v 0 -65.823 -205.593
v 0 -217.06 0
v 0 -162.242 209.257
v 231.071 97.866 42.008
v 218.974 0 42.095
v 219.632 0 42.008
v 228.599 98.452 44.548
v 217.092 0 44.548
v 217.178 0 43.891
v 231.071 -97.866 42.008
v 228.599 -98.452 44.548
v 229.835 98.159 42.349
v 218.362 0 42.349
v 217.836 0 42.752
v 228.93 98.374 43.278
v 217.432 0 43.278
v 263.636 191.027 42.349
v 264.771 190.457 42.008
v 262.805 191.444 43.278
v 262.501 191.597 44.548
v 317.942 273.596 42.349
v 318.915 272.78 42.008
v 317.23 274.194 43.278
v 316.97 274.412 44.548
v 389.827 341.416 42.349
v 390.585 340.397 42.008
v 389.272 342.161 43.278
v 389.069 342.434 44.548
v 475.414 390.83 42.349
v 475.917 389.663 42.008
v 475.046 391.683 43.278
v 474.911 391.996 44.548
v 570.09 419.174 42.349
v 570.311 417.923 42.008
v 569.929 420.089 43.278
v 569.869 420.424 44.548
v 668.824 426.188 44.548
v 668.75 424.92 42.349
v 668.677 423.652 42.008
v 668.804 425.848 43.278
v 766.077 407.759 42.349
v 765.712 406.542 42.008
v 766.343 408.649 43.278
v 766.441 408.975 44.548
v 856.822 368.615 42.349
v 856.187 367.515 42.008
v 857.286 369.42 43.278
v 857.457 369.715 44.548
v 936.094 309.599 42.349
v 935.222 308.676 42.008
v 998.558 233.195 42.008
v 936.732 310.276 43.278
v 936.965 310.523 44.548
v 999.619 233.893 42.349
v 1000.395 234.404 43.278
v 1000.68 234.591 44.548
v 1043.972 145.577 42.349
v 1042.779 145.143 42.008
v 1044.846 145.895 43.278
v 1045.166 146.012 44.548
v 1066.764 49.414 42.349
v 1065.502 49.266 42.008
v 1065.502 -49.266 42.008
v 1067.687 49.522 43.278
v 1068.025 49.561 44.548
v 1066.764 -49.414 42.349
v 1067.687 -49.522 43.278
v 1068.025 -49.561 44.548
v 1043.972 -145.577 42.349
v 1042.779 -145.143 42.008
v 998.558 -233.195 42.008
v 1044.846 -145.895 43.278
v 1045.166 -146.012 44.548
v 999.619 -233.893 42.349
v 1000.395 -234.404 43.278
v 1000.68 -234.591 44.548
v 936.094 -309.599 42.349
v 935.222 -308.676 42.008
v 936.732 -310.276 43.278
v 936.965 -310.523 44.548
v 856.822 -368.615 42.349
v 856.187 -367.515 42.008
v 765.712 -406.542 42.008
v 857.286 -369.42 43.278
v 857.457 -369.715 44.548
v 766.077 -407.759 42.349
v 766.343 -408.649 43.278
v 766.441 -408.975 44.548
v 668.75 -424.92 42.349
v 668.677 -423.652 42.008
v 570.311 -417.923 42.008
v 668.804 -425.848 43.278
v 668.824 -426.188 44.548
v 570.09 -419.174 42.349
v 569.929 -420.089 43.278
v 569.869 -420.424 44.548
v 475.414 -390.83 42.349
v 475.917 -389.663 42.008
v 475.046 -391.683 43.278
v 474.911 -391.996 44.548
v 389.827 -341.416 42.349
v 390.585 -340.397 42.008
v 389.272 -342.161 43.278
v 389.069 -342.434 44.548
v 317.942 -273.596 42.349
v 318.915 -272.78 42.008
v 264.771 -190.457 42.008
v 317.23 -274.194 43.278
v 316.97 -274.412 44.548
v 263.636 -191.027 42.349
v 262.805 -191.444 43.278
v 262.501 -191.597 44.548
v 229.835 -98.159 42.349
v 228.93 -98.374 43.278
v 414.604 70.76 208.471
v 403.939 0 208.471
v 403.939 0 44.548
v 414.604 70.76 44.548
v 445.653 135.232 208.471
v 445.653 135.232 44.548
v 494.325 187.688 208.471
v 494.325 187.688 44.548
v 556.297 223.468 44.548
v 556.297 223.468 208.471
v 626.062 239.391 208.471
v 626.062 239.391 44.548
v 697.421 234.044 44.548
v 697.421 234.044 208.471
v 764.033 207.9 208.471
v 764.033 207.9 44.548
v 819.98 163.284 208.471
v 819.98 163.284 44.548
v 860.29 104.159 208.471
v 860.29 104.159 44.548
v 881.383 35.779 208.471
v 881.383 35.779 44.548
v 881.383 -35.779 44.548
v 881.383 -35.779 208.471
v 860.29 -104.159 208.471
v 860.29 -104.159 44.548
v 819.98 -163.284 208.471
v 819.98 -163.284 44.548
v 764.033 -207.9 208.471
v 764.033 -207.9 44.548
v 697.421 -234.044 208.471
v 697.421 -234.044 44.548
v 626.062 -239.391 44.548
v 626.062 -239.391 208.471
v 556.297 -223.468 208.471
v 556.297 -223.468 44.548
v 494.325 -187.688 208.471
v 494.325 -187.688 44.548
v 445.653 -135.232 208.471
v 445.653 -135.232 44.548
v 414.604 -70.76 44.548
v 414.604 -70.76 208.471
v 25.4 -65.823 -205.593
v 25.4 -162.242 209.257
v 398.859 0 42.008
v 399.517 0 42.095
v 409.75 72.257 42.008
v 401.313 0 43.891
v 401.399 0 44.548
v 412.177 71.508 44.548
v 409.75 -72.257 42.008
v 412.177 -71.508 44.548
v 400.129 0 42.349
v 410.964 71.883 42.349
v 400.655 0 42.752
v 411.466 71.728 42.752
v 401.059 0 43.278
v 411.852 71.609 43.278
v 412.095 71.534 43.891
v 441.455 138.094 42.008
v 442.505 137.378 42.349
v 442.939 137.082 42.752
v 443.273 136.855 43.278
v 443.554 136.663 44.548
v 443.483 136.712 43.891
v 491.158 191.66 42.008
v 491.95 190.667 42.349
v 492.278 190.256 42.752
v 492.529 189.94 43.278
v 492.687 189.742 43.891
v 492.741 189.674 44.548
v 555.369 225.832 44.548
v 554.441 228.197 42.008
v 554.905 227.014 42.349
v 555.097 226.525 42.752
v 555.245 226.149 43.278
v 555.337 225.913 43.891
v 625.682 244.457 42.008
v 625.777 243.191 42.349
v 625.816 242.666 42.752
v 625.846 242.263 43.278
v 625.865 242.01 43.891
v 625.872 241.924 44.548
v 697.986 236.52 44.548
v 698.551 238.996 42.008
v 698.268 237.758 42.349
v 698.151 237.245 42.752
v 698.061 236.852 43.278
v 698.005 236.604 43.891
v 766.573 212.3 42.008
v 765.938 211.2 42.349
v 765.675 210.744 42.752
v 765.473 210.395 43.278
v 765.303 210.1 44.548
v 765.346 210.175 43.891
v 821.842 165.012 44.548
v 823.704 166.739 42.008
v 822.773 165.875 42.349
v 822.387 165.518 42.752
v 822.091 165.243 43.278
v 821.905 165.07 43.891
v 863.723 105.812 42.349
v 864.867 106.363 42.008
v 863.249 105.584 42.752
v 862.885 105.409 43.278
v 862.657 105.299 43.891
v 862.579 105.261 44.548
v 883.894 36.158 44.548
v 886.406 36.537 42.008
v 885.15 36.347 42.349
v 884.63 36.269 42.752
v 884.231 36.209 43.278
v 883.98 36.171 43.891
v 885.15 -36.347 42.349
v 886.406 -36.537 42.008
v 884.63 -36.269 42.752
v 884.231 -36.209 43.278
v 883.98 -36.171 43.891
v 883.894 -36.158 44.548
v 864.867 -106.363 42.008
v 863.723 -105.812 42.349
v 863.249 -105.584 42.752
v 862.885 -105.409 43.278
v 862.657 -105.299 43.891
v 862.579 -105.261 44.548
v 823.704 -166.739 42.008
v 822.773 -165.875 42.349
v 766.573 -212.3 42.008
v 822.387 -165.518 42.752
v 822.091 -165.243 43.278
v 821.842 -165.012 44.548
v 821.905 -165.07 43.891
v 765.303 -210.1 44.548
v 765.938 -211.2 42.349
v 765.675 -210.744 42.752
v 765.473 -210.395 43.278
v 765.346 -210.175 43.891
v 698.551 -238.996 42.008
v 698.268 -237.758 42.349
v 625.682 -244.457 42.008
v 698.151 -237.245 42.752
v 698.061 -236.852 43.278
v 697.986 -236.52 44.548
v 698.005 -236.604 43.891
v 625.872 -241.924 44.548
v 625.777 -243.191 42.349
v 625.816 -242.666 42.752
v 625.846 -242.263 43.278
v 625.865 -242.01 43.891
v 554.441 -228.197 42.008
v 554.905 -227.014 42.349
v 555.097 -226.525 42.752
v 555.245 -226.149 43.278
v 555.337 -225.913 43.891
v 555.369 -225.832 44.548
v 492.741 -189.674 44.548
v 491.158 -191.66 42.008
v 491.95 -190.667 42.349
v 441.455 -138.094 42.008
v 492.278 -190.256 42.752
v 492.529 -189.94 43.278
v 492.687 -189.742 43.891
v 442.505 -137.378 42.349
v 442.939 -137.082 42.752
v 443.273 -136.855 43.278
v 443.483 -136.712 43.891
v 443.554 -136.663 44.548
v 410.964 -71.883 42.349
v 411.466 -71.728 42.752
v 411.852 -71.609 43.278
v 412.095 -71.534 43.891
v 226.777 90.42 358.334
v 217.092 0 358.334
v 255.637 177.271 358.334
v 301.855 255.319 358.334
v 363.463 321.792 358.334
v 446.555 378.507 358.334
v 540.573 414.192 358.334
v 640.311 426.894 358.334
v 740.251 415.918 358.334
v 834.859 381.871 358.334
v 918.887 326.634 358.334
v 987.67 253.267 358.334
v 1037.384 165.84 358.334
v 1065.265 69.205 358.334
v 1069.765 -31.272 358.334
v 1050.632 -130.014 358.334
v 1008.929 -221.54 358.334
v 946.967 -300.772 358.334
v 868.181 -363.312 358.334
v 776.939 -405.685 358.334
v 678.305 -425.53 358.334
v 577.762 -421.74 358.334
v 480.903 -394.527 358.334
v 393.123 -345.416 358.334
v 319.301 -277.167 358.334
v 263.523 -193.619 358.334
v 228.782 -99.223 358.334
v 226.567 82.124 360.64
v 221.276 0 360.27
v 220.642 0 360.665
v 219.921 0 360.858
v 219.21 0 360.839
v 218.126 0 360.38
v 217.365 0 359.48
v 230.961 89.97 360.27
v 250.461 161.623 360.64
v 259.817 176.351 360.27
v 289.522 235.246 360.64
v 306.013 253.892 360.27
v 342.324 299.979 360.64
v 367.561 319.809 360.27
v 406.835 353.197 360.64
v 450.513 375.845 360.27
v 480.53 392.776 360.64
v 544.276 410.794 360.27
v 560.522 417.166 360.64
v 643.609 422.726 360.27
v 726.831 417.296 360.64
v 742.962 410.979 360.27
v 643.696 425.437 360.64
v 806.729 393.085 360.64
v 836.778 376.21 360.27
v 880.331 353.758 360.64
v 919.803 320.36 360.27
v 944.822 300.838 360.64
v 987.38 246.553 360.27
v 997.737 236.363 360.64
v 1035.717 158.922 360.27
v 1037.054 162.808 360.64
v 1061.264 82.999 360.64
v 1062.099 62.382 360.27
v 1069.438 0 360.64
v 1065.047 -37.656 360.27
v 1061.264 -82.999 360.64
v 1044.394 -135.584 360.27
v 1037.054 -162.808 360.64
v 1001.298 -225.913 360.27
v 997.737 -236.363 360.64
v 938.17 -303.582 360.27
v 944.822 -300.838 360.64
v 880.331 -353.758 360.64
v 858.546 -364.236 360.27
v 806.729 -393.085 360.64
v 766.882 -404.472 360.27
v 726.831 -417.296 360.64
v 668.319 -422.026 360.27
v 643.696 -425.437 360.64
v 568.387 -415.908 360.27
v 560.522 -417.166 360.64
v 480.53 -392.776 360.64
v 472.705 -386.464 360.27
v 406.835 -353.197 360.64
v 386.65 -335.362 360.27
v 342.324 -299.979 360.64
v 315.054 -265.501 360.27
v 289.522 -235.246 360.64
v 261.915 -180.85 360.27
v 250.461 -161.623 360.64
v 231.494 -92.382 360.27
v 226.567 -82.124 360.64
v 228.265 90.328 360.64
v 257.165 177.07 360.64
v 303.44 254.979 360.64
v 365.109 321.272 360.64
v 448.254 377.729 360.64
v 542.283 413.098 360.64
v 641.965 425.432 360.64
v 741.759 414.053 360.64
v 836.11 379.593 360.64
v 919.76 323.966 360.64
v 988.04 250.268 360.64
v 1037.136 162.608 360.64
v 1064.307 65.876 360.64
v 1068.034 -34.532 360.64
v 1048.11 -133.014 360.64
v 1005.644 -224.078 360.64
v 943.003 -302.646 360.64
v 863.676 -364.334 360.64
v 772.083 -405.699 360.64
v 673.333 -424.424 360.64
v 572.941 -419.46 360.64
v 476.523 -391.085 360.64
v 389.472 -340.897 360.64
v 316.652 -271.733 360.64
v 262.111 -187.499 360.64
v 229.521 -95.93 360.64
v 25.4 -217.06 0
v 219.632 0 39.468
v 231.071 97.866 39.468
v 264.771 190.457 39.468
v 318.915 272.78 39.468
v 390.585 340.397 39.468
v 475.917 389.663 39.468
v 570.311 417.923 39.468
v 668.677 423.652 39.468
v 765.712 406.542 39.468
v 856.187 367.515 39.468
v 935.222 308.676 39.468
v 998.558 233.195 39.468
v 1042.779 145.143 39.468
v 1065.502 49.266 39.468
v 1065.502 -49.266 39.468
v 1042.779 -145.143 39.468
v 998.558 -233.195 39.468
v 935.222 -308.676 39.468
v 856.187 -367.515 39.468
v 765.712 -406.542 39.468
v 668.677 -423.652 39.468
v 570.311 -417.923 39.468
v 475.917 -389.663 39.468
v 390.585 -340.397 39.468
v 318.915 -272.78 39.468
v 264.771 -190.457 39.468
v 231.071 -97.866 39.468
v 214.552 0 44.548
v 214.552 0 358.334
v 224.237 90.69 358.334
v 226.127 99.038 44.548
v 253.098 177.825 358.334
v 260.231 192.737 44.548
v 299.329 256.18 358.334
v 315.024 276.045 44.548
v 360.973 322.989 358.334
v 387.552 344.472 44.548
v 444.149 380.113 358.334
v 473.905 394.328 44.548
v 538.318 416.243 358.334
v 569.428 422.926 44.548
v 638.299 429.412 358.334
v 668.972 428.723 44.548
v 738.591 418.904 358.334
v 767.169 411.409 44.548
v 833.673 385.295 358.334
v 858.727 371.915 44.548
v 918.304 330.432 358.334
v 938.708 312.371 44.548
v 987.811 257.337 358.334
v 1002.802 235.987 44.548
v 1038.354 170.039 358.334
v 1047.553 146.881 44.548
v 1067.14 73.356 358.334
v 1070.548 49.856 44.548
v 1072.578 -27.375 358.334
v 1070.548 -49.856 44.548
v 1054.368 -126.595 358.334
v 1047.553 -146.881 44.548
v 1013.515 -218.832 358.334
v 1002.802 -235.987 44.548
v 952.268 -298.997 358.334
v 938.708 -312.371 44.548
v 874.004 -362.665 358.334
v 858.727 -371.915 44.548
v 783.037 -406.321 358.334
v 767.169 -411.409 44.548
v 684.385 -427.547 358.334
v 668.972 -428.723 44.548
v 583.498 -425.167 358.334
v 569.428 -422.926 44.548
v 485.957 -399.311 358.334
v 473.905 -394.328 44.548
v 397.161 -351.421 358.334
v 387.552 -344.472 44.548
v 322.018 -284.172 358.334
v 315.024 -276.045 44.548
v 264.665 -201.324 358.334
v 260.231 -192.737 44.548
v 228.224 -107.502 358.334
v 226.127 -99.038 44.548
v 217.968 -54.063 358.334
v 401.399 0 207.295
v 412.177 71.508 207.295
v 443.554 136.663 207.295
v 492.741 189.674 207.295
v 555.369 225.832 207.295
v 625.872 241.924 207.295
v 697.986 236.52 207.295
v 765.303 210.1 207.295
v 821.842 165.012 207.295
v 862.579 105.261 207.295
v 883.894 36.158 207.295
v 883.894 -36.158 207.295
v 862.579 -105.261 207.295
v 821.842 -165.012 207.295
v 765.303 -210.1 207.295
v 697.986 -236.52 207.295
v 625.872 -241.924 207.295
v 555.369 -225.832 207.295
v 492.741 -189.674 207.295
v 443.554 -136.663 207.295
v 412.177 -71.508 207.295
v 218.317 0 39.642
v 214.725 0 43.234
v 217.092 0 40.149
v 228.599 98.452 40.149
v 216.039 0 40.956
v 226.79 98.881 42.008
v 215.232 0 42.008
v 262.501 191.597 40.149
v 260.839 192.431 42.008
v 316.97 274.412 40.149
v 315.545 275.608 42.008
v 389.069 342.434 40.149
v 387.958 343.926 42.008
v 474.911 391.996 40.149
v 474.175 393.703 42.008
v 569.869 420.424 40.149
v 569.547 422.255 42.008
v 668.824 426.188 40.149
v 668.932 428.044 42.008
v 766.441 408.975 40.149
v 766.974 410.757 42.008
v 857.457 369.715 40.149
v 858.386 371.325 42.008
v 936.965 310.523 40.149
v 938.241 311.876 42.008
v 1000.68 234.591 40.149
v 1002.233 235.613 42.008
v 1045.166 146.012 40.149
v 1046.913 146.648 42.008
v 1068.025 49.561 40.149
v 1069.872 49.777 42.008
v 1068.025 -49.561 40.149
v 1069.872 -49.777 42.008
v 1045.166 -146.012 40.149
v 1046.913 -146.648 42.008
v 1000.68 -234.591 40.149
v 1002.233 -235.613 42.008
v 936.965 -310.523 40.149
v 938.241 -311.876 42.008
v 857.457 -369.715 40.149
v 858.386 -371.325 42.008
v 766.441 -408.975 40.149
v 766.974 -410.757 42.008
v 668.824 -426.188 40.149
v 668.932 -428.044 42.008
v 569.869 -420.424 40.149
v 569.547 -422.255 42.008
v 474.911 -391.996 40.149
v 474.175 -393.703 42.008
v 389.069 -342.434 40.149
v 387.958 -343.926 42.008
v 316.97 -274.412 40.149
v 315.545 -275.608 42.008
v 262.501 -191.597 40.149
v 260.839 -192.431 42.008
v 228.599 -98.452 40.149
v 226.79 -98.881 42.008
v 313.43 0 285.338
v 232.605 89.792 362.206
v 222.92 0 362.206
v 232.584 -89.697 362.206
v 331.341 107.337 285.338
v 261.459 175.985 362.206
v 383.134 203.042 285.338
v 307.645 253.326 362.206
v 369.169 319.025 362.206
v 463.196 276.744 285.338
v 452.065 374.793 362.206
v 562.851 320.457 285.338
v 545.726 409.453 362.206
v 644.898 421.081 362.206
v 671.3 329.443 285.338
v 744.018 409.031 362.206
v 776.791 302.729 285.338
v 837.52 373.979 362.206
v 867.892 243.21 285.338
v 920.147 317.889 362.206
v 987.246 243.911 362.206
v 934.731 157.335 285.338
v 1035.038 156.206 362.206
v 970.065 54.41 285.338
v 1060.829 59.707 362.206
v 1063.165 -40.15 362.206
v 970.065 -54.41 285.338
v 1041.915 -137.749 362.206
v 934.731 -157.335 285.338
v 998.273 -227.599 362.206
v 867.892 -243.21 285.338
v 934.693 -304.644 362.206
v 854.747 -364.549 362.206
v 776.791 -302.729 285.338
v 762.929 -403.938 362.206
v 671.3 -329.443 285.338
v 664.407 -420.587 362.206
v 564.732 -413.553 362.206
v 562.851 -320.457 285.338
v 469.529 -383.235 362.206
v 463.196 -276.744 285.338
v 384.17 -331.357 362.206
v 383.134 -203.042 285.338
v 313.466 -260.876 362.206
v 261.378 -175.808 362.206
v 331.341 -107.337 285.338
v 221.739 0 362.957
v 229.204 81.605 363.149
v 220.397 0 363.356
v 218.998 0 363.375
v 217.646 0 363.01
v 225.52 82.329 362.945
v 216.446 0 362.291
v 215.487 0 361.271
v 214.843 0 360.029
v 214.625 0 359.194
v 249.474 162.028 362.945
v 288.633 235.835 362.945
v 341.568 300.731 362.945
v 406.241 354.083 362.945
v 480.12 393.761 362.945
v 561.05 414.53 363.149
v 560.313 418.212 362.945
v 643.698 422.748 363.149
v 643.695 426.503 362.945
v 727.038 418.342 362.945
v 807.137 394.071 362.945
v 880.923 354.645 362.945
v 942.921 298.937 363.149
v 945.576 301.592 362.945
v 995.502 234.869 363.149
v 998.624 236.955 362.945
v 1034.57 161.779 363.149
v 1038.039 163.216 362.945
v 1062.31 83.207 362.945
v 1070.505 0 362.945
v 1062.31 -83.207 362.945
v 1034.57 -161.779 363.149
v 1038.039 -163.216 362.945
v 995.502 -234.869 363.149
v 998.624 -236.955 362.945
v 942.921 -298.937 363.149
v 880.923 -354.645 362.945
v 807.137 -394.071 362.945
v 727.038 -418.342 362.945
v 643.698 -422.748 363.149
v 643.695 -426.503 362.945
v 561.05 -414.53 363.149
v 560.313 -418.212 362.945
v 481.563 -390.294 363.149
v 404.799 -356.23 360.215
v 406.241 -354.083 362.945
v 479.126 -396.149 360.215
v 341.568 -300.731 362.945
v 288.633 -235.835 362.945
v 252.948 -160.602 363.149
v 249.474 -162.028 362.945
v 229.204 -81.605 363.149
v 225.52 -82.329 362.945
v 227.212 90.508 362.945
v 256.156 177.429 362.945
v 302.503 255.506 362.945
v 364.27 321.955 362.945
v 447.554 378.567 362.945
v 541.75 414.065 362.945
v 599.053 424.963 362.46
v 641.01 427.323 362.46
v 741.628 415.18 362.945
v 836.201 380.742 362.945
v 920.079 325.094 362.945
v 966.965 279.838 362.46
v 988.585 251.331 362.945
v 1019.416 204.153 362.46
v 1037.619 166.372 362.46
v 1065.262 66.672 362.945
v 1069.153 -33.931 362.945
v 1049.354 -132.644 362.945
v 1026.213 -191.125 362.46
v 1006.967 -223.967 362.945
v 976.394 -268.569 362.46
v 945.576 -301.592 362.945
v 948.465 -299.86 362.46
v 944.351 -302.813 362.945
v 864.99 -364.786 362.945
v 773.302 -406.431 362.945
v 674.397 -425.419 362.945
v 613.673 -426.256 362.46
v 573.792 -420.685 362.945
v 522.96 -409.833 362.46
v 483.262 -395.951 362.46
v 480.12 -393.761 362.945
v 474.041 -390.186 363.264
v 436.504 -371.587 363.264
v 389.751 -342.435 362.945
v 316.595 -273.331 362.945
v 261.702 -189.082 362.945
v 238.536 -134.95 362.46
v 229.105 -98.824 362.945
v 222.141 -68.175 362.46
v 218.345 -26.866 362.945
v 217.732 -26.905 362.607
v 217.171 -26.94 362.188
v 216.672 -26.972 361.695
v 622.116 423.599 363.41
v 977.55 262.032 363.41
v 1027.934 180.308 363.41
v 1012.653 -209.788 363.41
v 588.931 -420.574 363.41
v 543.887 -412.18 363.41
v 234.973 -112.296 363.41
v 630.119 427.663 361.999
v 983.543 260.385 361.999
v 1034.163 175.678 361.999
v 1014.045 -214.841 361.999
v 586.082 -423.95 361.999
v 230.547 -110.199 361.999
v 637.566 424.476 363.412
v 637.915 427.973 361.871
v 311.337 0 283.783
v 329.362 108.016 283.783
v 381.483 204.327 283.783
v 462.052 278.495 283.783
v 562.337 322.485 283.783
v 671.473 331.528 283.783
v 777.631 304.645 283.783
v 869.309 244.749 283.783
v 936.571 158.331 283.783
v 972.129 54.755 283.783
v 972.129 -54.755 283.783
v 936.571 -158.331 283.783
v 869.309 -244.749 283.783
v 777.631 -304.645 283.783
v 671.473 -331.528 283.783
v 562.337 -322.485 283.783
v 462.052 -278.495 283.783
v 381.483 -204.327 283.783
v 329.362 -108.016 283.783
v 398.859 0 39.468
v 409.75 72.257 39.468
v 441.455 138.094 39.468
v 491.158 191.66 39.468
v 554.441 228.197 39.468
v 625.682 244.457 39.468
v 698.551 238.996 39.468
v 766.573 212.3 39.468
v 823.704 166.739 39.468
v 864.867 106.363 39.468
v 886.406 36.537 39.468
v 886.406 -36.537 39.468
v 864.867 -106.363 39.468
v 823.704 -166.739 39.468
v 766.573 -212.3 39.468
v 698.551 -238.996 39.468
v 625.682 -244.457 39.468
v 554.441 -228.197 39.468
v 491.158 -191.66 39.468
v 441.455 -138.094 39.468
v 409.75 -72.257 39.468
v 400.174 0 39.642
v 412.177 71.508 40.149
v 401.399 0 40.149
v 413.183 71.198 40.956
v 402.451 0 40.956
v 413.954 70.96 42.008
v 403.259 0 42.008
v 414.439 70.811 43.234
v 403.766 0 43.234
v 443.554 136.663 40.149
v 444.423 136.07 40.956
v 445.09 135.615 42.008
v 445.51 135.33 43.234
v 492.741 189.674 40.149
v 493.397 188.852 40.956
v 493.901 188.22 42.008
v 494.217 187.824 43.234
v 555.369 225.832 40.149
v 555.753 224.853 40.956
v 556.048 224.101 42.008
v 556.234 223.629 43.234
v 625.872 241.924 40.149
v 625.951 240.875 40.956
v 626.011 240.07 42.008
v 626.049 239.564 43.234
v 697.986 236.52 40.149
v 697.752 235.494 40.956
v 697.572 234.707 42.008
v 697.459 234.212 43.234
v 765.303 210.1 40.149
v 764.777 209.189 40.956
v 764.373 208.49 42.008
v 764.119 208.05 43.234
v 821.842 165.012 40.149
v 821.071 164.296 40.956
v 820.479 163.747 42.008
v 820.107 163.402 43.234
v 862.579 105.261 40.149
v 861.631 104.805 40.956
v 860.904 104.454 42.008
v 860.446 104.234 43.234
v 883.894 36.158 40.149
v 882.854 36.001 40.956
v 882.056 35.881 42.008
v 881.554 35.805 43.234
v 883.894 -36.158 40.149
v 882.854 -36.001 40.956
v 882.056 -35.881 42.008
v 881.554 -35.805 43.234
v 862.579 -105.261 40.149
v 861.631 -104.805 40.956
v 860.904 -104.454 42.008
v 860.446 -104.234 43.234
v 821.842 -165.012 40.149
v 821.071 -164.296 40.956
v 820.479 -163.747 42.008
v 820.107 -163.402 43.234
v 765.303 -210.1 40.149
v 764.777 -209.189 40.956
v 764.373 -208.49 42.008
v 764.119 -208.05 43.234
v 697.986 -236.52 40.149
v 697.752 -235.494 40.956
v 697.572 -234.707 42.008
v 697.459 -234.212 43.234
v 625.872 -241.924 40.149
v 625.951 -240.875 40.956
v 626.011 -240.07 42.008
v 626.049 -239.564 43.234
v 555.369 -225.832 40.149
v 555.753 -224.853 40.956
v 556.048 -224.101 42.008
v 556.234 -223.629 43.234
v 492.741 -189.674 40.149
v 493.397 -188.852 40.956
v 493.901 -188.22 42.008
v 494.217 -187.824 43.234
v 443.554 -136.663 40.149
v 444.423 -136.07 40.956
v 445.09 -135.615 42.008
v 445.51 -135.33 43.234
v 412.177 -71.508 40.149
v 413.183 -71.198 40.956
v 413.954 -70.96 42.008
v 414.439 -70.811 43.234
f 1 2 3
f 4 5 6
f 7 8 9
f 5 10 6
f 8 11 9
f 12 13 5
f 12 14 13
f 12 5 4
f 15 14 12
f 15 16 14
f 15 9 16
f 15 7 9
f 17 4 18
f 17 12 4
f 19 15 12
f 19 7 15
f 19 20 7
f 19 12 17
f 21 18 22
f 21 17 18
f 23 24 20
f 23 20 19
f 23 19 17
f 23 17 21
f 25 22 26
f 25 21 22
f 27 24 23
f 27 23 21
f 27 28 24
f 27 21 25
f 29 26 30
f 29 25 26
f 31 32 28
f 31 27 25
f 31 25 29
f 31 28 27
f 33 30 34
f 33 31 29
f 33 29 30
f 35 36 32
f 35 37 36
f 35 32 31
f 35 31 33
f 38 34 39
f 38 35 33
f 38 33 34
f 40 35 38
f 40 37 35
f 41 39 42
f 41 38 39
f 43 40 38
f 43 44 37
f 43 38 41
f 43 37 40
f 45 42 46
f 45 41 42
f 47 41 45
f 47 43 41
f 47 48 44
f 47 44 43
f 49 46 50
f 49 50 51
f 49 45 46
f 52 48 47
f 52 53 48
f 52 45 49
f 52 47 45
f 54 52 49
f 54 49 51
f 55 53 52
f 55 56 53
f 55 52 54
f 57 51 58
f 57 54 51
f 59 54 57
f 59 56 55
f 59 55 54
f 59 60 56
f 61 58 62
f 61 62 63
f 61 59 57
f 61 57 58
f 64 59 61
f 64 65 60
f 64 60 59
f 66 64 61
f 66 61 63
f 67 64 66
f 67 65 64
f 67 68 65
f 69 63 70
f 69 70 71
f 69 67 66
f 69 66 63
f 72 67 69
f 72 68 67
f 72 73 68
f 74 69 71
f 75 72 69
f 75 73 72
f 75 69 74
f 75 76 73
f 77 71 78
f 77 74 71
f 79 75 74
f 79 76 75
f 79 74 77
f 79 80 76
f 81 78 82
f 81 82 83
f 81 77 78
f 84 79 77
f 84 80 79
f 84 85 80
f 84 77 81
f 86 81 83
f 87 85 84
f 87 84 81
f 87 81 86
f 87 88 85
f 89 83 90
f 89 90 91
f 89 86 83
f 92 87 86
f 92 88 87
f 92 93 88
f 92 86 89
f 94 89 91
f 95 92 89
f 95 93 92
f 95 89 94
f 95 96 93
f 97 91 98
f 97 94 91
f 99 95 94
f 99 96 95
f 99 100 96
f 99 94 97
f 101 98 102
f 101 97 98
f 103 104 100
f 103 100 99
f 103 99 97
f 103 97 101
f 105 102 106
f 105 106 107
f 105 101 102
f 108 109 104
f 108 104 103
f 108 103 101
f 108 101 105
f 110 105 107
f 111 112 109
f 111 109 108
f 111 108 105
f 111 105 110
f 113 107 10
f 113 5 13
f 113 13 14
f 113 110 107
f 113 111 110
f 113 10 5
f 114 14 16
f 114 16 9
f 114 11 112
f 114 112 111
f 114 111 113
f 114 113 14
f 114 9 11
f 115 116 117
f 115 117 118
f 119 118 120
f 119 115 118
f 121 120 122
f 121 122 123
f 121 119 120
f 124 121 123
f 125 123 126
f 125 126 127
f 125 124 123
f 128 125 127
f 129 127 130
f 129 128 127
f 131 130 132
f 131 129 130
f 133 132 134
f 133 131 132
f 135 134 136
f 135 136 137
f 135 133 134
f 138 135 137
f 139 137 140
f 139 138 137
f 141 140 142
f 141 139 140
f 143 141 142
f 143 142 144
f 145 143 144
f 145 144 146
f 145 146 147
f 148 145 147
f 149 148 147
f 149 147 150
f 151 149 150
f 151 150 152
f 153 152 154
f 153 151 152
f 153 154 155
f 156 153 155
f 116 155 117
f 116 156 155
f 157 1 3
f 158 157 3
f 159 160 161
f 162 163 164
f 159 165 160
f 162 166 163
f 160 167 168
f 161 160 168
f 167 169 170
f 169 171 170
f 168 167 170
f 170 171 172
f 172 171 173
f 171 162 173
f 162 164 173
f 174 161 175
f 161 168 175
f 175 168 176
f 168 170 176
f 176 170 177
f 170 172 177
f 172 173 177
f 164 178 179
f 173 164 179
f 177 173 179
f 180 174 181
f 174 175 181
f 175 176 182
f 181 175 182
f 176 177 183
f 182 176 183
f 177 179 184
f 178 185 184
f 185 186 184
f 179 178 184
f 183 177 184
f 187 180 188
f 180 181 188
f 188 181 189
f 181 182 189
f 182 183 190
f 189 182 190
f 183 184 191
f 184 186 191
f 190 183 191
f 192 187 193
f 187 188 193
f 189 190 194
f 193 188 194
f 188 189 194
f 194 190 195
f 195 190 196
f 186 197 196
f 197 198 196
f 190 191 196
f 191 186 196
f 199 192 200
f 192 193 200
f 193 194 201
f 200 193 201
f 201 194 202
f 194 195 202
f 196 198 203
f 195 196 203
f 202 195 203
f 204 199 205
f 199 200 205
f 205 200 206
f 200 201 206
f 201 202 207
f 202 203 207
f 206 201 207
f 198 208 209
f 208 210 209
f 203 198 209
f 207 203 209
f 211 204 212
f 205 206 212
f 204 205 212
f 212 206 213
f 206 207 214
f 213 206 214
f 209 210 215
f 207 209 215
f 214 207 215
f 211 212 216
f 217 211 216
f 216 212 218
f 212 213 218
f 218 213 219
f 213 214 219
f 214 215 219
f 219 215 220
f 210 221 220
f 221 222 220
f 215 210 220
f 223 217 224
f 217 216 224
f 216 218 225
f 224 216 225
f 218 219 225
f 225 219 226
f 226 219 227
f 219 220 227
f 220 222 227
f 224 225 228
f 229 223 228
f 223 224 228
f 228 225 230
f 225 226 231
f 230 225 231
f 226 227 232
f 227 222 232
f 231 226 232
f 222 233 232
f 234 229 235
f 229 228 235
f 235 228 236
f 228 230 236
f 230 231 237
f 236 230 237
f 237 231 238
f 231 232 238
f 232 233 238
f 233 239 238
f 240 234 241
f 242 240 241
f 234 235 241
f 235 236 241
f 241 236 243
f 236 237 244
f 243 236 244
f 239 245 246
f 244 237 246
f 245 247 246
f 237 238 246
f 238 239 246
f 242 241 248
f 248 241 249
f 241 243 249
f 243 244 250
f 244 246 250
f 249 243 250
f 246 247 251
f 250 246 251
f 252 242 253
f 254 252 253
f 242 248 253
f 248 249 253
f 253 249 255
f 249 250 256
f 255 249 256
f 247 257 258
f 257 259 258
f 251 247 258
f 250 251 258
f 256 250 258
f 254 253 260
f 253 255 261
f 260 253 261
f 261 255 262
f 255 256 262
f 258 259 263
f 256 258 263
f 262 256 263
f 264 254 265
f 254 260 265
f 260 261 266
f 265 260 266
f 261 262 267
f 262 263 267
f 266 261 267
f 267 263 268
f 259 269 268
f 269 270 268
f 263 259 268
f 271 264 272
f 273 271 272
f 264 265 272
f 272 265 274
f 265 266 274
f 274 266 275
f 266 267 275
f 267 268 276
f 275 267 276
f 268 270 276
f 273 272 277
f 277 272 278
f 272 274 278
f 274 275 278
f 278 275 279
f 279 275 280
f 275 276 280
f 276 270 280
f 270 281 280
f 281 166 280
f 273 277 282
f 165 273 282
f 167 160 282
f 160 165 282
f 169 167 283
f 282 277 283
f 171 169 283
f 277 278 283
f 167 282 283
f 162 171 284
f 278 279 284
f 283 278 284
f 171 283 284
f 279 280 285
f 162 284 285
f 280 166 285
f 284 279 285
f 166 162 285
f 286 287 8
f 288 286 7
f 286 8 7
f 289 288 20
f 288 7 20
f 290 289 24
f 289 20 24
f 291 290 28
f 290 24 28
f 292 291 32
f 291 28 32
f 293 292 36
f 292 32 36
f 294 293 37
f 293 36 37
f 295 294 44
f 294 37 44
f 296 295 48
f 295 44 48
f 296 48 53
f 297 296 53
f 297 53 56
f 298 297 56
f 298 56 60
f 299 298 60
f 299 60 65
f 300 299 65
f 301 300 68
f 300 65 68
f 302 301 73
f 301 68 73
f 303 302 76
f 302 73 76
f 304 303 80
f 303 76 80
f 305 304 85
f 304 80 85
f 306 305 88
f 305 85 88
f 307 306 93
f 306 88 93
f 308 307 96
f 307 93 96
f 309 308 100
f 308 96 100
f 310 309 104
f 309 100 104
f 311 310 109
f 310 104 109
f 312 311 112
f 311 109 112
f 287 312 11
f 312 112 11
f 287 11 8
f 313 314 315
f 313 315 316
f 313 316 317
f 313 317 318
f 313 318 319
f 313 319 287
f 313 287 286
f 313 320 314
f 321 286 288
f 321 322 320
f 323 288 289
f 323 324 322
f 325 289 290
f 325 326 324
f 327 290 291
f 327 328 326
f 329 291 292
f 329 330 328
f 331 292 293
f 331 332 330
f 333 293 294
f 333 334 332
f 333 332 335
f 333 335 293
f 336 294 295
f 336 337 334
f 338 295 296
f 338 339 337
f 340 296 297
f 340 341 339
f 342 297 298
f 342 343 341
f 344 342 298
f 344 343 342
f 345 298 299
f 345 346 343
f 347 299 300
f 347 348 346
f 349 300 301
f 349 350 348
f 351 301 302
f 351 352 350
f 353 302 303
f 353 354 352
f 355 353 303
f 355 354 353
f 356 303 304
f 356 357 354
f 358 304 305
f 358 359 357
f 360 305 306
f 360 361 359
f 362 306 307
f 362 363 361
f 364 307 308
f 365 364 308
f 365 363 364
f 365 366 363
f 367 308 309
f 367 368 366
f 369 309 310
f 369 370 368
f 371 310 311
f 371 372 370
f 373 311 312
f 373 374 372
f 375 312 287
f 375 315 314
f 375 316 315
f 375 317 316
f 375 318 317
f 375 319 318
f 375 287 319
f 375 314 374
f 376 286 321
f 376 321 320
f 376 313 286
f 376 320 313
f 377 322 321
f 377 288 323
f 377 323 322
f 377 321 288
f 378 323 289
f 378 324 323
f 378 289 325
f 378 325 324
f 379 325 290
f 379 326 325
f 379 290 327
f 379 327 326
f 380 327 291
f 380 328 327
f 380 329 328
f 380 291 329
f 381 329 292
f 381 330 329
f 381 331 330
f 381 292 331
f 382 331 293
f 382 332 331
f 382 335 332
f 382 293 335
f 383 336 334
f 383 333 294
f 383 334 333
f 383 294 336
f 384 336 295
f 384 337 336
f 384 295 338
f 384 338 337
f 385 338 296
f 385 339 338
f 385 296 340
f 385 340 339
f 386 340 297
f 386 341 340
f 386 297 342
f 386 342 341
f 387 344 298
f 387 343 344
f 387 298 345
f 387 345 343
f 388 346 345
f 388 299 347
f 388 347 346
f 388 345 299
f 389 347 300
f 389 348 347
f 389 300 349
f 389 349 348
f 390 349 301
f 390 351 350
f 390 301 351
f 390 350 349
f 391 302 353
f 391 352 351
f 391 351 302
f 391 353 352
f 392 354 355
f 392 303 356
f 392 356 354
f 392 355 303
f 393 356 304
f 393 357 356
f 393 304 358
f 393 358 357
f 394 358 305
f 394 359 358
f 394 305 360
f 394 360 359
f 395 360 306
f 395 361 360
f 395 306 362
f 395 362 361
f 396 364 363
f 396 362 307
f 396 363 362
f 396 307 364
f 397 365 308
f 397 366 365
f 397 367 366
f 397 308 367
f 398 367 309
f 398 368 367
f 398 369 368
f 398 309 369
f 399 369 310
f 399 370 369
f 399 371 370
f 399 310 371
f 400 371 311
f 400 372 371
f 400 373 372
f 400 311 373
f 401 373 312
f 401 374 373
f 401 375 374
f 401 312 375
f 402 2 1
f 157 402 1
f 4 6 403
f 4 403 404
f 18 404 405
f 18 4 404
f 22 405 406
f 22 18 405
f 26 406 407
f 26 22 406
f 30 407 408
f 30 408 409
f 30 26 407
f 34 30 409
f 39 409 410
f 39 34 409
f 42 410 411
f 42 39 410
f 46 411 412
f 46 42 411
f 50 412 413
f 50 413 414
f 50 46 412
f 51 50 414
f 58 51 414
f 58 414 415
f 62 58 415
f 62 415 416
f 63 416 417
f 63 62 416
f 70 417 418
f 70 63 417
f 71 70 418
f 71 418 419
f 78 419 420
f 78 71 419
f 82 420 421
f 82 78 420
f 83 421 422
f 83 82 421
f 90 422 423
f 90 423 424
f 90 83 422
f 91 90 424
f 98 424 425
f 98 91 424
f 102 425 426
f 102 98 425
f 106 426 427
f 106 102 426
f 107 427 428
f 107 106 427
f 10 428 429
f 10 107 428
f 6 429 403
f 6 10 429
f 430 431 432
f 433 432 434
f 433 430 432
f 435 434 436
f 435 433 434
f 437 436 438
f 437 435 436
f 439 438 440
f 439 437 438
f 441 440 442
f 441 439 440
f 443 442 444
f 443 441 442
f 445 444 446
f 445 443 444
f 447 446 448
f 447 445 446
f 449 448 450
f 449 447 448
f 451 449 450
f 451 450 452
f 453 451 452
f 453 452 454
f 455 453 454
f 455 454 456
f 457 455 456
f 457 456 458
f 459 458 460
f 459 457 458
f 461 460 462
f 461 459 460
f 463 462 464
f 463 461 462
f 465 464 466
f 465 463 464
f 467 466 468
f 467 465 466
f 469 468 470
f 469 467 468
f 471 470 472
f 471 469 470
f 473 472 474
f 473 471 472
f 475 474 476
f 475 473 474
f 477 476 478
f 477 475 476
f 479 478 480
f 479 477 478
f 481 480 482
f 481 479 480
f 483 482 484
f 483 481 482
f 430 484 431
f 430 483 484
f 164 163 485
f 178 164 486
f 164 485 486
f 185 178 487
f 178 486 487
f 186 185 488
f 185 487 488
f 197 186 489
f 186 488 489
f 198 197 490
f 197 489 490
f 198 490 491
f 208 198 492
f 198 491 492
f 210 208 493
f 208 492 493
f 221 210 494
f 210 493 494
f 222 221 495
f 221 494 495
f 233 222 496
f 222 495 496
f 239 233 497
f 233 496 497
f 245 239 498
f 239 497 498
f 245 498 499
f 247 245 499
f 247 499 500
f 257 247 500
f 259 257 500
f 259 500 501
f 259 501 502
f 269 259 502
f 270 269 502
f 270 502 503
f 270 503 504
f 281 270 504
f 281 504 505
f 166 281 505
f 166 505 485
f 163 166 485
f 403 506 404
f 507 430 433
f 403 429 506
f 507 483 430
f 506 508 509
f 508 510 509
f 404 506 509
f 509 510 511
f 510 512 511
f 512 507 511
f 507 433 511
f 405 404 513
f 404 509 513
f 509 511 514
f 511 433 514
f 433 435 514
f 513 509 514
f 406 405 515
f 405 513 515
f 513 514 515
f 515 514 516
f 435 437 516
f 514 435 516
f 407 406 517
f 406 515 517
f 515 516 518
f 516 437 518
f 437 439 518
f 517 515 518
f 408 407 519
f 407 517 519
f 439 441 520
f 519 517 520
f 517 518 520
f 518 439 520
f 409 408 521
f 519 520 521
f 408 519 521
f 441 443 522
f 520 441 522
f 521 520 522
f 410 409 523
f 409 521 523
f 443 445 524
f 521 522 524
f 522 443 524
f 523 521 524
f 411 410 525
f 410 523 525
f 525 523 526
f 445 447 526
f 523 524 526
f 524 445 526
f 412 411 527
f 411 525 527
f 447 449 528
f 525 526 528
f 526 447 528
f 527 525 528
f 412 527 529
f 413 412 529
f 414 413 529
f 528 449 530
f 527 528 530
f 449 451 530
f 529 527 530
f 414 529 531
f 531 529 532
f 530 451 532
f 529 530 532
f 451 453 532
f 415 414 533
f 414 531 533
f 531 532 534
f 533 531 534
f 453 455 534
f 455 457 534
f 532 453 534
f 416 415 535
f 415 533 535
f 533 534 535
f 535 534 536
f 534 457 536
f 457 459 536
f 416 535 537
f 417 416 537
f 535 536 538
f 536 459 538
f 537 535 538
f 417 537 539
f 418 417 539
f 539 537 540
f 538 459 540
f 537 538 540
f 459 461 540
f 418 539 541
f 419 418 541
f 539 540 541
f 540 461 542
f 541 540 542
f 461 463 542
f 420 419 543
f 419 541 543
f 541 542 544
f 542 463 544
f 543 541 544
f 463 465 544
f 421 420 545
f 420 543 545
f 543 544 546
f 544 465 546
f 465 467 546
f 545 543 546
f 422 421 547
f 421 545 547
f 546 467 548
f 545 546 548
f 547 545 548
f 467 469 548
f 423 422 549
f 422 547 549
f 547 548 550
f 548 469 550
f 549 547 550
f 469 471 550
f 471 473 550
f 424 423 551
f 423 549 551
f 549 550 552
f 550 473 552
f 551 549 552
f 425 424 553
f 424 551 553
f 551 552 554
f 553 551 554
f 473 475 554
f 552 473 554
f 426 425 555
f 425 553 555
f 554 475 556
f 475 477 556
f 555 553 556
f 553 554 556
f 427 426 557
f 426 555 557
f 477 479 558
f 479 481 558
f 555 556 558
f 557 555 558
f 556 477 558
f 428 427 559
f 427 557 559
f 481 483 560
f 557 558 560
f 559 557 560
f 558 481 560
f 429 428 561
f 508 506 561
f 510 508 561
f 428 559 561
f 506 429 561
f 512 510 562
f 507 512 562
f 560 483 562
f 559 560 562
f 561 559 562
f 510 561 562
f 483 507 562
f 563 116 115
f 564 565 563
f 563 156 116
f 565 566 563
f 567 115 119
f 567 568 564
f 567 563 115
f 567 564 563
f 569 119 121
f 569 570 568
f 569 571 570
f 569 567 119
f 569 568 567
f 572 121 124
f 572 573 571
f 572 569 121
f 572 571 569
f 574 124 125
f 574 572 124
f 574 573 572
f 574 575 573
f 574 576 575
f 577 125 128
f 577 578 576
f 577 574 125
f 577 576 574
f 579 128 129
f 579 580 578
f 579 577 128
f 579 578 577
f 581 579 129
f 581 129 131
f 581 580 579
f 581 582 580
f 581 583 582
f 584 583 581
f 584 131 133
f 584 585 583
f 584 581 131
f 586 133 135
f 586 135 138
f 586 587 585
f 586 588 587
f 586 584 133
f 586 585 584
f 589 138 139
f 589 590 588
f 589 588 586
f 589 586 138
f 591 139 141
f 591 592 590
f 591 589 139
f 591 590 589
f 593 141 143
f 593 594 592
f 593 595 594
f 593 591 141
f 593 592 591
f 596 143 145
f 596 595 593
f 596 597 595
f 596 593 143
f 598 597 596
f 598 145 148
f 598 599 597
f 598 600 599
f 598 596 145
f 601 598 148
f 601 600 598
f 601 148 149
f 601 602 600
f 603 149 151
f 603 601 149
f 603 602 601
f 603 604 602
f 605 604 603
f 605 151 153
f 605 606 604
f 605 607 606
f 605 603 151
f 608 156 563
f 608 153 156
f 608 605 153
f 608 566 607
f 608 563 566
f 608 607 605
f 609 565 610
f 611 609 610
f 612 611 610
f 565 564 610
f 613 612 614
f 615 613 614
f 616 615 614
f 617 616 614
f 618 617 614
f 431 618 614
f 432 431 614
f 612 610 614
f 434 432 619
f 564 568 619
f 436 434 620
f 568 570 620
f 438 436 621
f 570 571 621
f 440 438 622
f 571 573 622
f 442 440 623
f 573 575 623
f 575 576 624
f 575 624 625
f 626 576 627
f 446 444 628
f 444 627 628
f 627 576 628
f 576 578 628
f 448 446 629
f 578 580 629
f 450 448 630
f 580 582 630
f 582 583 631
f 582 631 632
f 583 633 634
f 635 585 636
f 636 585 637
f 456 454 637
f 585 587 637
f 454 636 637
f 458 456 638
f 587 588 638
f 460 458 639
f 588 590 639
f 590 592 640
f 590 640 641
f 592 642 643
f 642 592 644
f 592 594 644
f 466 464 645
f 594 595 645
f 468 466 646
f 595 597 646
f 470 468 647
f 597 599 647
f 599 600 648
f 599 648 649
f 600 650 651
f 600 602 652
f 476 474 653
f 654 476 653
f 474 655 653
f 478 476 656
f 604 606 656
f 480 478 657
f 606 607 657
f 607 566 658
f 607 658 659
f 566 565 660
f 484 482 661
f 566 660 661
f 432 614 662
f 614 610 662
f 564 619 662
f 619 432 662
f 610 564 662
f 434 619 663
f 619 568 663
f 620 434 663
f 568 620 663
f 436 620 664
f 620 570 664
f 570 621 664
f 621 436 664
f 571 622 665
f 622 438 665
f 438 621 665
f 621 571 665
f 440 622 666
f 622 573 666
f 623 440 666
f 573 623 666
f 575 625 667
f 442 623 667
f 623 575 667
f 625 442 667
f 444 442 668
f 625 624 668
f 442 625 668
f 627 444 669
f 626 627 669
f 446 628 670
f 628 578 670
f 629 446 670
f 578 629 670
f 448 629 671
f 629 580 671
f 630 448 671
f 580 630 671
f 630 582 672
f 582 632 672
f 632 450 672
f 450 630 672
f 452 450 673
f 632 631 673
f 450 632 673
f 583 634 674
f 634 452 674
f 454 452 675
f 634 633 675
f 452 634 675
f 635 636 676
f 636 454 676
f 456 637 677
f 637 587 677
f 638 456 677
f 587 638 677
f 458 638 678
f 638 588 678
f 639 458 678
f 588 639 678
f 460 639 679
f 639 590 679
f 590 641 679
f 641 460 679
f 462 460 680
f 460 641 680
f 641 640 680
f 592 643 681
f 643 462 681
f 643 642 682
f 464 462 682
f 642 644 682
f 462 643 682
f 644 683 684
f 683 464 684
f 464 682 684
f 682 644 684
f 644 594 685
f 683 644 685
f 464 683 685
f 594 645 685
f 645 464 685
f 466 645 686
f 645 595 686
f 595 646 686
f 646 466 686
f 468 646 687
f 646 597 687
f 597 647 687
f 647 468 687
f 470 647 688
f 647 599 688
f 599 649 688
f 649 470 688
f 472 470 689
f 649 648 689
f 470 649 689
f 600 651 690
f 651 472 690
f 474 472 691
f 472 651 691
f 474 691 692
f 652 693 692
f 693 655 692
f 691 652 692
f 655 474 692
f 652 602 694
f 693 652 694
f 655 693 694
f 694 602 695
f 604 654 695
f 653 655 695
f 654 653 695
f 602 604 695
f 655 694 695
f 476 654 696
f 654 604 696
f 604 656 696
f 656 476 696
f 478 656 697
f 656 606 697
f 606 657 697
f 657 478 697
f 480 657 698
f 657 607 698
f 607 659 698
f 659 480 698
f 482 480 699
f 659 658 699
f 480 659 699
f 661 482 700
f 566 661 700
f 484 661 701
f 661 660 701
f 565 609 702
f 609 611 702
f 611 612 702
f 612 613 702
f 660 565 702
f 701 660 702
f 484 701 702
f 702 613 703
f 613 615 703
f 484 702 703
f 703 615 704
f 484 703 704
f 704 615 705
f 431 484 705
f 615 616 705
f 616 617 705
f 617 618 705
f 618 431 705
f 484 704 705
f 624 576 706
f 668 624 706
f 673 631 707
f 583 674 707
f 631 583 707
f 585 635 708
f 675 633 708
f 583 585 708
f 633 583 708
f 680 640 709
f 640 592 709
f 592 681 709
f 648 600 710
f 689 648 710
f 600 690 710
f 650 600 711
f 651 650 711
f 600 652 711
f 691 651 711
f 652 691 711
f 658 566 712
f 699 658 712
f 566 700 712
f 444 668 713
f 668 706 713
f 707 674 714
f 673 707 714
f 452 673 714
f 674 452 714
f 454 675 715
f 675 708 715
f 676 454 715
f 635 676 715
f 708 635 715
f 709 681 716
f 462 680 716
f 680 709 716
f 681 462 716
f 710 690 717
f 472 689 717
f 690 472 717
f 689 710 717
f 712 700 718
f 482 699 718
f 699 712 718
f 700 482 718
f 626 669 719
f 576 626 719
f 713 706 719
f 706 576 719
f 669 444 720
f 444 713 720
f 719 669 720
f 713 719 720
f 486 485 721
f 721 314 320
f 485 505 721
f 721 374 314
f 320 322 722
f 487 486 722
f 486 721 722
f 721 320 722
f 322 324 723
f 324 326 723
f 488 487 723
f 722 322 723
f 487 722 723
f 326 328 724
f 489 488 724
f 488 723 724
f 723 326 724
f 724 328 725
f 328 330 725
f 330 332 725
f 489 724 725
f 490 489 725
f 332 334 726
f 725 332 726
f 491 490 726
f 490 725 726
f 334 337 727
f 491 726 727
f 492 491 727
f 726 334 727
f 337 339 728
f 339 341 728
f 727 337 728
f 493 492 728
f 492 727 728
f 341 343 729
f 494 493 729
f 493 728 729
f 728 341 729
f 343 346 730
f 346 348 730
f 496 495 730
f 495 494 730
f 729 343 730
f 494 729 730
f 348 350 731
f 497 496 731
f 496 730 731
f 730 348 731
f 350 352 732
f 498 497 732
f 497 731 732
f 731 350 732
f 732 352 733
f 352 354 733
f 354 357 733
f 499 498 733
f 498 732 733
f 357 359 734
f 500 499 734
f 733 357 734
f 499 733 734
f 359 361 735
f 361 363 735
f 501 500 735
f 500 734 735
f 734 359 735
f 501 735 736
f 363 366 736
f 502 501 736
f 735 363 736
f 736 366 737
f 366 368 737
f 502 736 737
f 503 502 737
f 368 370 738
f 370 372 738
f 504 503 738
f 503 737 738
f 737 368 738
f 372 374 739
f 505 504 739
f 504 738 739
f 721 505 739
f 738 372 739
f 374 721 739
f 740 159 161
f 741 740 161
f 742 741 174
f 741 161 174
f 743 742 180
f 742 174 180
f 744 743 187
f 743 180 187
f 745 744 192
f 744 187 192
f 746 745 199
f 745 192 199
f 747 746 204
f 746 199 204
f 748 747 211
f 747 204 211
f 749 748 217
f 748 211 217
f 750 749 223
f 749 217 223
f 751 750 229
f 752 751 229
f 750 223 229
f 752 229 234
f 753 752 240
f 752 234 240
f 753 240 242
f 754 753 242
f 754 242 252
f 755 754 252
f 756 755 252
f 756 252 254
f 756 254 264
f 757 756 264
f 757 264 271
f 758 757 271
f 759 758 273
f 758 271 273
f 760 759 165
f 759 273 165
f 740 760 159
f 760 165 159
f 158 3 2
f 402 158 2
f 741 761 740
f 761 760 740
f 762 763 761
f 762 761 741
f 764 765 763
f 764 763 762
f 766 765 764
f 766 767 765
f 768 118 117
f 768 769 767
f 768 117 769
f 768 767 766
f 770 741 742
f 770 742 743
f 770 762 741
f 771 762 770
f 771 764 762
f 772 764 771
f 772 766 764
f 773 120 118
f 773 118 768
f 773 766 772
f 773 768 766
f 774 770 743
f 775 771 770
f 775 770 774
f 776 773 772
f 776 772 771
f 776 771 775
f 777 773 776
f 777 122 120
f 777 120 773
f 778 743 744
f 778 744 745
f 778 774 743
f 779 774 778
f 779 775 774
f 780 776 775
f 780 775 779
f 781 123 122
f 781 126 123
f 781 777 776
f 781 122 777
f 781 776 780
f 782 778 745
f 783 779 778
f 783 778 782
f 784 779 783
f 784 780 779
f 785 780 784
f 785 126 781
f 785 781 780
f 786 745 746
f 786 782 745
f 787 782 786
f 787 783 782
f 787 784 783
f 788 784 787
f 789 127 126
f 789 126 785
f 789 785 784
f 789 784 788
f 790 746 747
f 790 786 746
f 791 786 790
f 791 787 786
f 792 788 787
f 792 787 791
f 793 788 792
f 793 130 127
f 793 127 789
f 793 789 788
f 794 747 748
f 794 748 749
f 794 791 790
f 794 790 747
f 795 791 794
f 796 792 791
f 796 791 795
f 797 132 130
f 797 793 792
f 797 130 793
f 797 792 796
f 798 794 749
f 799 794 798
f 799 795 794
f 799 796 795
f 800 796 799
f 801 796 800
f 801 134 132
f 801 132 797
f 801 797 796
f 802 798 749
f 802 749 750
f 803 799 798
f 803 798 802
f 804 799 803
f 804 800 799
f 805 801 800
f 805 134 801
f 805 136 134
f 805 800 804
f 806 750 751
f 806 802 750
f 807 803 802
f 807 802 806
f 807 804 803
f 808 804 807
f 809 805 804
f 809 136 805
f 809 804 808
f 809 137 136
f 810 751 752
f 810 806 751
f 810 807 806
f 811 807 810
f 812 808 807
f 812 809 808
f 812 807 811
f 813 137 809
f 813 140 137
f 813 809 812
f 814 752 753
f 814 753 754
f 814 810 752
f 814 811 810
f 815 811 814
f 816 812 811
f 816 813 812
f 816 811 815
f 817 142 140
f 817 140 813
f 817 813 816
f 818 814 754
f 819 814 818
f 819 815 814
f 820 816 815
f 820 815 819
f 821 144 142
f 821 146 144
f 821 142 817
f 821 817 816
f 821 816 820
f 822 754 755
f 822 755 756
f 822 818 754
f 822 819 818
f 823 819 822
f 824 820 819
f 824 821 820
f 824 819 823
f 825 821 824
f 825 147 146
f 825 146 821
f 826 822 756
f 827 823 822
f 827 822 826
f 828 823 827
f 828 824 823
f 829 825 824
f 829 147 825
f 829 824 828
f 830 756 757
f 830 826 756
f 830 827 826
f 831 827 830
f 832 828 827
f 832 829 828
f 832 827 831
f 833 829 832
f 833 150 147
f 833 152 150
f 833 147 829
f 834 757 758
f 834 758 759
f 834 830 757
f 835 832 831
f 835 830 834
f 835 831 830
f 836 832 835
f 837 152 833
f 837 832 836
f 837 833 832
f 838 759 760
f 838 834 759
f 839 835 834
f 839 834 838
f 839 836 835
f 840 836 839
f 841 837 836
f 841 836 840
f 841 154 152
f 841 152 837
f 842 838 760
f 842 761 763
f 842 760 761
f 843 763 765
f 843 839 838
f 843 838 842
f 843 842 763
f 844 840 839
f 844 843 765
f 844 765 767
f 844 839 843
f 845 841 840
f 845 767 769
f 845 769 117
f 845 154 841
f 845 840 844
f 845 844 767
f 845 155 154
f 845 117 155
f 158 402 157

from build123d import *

# Parameters (mm, degrees)
F0_W     = 165.3737425804
F0_H     = 124.4190223515
F1_DEPTH = 25.4
F3_W     = 115.6221553683
F3_H     = 126.1607408524
F3_W_2   = 170.5438941717
F3_H_2   = 219.3448096514
F4_T     = -2.54
F4_2_T   = -2.54
F6_DEPTH = 25.4
F7_W     = 189.3875896931
F7_H     = 169.002037769
F9_R     = 5.08
F10_T    = -2.54


# Not quite as in the source:
# - a shell that OpenCascade refuses in one call is made with other operations: the cavity is built on its own and cut out


with BuildPart() as f1:
    # F0 (on Front) → F1 (new body)
    with BuildSketch(Plane.XZ):
        with Locations((-11.4489495754, -2.2449400276)):
            Rectangle(F0_W, F0_H)
    extrude(amount=F1_DEPTH)

    # F3 (on Right) → F11, piece 2 (revolve)
    with BuildSketch(Plane.YZ):
        with Locations((100.368924439, 45.5251559615)):
            Rectangle(F3_W_2, F3_H_2)
    revolve(axis=Axis((71.2379217148, -25.4, -2.2449400276), (0, 0, -1)))

    # F4#2
    f4_2_openings = [f1.faces().sort_by_distance(p)[0] for p in [
        (140.460931, -230.471734, 155.197561),
    ]]
    offset(amount=F4_2_T, openings=f4_2_openings, kind=Kind.INTERSECTION)


with BuildPart() as f11:
    # F3 (on Right) → F11 (revolve)
    with BuildSketch(Plane.YZ):
        with Locations((128.4491606057, 218.544781208)):
            Rectangle(F3_W, F3_H)
    revolve(axis=Axis((71.2379217148, -25.4, -2.2449400276), (0, 0, -1)))

    # F4
    f4_openings = [f11.faces().sort_by_distance(p)[0] for p in [
        (140.460931, -231.073583, 281.625152),
    ]]
    offset(amount=F4_T, openings=f4_openings)


with BuildPart() as f6:
    # F2 (on Right) → F6 (new body)
    with BuildSketch(Plane.YZ):
        Polygon((-162.2416079044, 209.2569768429), (-217.0603871346, 0), (-65.8233910799, -205.5934518576), align=None)
    extrude(amount=F6_DEPTH)


with BuildPart() as f8:
    # F7 (on Front) → F8 (revolve)
    with BuildSketch(Plane.XZ):
        with Locations((309.2453479767, 123.9695076462)):
            Rectangle(F7_W, F7_H)
        Polygon((214.5515531301, 208.4705265307), (403.9391428232, 208.4705265307), (214.5515531301, 369.3135349012), align=None)
    revolve(axis=Axis((644.0016031265, 0, 168.0627539754), (0, 0, -1)))

    # F9
    f9_edges = [f8.edges().sort_by_distance(p)[0] for p in [
        (1073.451653, 0, 369.313535),
        (1073.451653, 0, 39.468489),
        (884.064063, 0, 39.468489),
    ]]
    fillet(f9_edges, radius=F9_R)

    # F10: a shell. OpenCascade refuses it in one call, so the cavity is built on its own and cut out:
    # the body offset inwards by the wall thickness, plus a prism from it out through each open face.
    f10_core = offset(f8.part, amount=F10_T, mode=Mode.PRIVATE)
    f10_exits = [f10_core.faces().sort_by_distance(p)[0] for p in [
        (1056.368656, 0, 42.008489),
    ]]
    add(f10_core, mode=Mode.SUBTRACT)
    extrude(f10_exits, amount=-F10_T, mode=Mode.SUBTRACT)


solid = Compound([f6.part, f8.part])
